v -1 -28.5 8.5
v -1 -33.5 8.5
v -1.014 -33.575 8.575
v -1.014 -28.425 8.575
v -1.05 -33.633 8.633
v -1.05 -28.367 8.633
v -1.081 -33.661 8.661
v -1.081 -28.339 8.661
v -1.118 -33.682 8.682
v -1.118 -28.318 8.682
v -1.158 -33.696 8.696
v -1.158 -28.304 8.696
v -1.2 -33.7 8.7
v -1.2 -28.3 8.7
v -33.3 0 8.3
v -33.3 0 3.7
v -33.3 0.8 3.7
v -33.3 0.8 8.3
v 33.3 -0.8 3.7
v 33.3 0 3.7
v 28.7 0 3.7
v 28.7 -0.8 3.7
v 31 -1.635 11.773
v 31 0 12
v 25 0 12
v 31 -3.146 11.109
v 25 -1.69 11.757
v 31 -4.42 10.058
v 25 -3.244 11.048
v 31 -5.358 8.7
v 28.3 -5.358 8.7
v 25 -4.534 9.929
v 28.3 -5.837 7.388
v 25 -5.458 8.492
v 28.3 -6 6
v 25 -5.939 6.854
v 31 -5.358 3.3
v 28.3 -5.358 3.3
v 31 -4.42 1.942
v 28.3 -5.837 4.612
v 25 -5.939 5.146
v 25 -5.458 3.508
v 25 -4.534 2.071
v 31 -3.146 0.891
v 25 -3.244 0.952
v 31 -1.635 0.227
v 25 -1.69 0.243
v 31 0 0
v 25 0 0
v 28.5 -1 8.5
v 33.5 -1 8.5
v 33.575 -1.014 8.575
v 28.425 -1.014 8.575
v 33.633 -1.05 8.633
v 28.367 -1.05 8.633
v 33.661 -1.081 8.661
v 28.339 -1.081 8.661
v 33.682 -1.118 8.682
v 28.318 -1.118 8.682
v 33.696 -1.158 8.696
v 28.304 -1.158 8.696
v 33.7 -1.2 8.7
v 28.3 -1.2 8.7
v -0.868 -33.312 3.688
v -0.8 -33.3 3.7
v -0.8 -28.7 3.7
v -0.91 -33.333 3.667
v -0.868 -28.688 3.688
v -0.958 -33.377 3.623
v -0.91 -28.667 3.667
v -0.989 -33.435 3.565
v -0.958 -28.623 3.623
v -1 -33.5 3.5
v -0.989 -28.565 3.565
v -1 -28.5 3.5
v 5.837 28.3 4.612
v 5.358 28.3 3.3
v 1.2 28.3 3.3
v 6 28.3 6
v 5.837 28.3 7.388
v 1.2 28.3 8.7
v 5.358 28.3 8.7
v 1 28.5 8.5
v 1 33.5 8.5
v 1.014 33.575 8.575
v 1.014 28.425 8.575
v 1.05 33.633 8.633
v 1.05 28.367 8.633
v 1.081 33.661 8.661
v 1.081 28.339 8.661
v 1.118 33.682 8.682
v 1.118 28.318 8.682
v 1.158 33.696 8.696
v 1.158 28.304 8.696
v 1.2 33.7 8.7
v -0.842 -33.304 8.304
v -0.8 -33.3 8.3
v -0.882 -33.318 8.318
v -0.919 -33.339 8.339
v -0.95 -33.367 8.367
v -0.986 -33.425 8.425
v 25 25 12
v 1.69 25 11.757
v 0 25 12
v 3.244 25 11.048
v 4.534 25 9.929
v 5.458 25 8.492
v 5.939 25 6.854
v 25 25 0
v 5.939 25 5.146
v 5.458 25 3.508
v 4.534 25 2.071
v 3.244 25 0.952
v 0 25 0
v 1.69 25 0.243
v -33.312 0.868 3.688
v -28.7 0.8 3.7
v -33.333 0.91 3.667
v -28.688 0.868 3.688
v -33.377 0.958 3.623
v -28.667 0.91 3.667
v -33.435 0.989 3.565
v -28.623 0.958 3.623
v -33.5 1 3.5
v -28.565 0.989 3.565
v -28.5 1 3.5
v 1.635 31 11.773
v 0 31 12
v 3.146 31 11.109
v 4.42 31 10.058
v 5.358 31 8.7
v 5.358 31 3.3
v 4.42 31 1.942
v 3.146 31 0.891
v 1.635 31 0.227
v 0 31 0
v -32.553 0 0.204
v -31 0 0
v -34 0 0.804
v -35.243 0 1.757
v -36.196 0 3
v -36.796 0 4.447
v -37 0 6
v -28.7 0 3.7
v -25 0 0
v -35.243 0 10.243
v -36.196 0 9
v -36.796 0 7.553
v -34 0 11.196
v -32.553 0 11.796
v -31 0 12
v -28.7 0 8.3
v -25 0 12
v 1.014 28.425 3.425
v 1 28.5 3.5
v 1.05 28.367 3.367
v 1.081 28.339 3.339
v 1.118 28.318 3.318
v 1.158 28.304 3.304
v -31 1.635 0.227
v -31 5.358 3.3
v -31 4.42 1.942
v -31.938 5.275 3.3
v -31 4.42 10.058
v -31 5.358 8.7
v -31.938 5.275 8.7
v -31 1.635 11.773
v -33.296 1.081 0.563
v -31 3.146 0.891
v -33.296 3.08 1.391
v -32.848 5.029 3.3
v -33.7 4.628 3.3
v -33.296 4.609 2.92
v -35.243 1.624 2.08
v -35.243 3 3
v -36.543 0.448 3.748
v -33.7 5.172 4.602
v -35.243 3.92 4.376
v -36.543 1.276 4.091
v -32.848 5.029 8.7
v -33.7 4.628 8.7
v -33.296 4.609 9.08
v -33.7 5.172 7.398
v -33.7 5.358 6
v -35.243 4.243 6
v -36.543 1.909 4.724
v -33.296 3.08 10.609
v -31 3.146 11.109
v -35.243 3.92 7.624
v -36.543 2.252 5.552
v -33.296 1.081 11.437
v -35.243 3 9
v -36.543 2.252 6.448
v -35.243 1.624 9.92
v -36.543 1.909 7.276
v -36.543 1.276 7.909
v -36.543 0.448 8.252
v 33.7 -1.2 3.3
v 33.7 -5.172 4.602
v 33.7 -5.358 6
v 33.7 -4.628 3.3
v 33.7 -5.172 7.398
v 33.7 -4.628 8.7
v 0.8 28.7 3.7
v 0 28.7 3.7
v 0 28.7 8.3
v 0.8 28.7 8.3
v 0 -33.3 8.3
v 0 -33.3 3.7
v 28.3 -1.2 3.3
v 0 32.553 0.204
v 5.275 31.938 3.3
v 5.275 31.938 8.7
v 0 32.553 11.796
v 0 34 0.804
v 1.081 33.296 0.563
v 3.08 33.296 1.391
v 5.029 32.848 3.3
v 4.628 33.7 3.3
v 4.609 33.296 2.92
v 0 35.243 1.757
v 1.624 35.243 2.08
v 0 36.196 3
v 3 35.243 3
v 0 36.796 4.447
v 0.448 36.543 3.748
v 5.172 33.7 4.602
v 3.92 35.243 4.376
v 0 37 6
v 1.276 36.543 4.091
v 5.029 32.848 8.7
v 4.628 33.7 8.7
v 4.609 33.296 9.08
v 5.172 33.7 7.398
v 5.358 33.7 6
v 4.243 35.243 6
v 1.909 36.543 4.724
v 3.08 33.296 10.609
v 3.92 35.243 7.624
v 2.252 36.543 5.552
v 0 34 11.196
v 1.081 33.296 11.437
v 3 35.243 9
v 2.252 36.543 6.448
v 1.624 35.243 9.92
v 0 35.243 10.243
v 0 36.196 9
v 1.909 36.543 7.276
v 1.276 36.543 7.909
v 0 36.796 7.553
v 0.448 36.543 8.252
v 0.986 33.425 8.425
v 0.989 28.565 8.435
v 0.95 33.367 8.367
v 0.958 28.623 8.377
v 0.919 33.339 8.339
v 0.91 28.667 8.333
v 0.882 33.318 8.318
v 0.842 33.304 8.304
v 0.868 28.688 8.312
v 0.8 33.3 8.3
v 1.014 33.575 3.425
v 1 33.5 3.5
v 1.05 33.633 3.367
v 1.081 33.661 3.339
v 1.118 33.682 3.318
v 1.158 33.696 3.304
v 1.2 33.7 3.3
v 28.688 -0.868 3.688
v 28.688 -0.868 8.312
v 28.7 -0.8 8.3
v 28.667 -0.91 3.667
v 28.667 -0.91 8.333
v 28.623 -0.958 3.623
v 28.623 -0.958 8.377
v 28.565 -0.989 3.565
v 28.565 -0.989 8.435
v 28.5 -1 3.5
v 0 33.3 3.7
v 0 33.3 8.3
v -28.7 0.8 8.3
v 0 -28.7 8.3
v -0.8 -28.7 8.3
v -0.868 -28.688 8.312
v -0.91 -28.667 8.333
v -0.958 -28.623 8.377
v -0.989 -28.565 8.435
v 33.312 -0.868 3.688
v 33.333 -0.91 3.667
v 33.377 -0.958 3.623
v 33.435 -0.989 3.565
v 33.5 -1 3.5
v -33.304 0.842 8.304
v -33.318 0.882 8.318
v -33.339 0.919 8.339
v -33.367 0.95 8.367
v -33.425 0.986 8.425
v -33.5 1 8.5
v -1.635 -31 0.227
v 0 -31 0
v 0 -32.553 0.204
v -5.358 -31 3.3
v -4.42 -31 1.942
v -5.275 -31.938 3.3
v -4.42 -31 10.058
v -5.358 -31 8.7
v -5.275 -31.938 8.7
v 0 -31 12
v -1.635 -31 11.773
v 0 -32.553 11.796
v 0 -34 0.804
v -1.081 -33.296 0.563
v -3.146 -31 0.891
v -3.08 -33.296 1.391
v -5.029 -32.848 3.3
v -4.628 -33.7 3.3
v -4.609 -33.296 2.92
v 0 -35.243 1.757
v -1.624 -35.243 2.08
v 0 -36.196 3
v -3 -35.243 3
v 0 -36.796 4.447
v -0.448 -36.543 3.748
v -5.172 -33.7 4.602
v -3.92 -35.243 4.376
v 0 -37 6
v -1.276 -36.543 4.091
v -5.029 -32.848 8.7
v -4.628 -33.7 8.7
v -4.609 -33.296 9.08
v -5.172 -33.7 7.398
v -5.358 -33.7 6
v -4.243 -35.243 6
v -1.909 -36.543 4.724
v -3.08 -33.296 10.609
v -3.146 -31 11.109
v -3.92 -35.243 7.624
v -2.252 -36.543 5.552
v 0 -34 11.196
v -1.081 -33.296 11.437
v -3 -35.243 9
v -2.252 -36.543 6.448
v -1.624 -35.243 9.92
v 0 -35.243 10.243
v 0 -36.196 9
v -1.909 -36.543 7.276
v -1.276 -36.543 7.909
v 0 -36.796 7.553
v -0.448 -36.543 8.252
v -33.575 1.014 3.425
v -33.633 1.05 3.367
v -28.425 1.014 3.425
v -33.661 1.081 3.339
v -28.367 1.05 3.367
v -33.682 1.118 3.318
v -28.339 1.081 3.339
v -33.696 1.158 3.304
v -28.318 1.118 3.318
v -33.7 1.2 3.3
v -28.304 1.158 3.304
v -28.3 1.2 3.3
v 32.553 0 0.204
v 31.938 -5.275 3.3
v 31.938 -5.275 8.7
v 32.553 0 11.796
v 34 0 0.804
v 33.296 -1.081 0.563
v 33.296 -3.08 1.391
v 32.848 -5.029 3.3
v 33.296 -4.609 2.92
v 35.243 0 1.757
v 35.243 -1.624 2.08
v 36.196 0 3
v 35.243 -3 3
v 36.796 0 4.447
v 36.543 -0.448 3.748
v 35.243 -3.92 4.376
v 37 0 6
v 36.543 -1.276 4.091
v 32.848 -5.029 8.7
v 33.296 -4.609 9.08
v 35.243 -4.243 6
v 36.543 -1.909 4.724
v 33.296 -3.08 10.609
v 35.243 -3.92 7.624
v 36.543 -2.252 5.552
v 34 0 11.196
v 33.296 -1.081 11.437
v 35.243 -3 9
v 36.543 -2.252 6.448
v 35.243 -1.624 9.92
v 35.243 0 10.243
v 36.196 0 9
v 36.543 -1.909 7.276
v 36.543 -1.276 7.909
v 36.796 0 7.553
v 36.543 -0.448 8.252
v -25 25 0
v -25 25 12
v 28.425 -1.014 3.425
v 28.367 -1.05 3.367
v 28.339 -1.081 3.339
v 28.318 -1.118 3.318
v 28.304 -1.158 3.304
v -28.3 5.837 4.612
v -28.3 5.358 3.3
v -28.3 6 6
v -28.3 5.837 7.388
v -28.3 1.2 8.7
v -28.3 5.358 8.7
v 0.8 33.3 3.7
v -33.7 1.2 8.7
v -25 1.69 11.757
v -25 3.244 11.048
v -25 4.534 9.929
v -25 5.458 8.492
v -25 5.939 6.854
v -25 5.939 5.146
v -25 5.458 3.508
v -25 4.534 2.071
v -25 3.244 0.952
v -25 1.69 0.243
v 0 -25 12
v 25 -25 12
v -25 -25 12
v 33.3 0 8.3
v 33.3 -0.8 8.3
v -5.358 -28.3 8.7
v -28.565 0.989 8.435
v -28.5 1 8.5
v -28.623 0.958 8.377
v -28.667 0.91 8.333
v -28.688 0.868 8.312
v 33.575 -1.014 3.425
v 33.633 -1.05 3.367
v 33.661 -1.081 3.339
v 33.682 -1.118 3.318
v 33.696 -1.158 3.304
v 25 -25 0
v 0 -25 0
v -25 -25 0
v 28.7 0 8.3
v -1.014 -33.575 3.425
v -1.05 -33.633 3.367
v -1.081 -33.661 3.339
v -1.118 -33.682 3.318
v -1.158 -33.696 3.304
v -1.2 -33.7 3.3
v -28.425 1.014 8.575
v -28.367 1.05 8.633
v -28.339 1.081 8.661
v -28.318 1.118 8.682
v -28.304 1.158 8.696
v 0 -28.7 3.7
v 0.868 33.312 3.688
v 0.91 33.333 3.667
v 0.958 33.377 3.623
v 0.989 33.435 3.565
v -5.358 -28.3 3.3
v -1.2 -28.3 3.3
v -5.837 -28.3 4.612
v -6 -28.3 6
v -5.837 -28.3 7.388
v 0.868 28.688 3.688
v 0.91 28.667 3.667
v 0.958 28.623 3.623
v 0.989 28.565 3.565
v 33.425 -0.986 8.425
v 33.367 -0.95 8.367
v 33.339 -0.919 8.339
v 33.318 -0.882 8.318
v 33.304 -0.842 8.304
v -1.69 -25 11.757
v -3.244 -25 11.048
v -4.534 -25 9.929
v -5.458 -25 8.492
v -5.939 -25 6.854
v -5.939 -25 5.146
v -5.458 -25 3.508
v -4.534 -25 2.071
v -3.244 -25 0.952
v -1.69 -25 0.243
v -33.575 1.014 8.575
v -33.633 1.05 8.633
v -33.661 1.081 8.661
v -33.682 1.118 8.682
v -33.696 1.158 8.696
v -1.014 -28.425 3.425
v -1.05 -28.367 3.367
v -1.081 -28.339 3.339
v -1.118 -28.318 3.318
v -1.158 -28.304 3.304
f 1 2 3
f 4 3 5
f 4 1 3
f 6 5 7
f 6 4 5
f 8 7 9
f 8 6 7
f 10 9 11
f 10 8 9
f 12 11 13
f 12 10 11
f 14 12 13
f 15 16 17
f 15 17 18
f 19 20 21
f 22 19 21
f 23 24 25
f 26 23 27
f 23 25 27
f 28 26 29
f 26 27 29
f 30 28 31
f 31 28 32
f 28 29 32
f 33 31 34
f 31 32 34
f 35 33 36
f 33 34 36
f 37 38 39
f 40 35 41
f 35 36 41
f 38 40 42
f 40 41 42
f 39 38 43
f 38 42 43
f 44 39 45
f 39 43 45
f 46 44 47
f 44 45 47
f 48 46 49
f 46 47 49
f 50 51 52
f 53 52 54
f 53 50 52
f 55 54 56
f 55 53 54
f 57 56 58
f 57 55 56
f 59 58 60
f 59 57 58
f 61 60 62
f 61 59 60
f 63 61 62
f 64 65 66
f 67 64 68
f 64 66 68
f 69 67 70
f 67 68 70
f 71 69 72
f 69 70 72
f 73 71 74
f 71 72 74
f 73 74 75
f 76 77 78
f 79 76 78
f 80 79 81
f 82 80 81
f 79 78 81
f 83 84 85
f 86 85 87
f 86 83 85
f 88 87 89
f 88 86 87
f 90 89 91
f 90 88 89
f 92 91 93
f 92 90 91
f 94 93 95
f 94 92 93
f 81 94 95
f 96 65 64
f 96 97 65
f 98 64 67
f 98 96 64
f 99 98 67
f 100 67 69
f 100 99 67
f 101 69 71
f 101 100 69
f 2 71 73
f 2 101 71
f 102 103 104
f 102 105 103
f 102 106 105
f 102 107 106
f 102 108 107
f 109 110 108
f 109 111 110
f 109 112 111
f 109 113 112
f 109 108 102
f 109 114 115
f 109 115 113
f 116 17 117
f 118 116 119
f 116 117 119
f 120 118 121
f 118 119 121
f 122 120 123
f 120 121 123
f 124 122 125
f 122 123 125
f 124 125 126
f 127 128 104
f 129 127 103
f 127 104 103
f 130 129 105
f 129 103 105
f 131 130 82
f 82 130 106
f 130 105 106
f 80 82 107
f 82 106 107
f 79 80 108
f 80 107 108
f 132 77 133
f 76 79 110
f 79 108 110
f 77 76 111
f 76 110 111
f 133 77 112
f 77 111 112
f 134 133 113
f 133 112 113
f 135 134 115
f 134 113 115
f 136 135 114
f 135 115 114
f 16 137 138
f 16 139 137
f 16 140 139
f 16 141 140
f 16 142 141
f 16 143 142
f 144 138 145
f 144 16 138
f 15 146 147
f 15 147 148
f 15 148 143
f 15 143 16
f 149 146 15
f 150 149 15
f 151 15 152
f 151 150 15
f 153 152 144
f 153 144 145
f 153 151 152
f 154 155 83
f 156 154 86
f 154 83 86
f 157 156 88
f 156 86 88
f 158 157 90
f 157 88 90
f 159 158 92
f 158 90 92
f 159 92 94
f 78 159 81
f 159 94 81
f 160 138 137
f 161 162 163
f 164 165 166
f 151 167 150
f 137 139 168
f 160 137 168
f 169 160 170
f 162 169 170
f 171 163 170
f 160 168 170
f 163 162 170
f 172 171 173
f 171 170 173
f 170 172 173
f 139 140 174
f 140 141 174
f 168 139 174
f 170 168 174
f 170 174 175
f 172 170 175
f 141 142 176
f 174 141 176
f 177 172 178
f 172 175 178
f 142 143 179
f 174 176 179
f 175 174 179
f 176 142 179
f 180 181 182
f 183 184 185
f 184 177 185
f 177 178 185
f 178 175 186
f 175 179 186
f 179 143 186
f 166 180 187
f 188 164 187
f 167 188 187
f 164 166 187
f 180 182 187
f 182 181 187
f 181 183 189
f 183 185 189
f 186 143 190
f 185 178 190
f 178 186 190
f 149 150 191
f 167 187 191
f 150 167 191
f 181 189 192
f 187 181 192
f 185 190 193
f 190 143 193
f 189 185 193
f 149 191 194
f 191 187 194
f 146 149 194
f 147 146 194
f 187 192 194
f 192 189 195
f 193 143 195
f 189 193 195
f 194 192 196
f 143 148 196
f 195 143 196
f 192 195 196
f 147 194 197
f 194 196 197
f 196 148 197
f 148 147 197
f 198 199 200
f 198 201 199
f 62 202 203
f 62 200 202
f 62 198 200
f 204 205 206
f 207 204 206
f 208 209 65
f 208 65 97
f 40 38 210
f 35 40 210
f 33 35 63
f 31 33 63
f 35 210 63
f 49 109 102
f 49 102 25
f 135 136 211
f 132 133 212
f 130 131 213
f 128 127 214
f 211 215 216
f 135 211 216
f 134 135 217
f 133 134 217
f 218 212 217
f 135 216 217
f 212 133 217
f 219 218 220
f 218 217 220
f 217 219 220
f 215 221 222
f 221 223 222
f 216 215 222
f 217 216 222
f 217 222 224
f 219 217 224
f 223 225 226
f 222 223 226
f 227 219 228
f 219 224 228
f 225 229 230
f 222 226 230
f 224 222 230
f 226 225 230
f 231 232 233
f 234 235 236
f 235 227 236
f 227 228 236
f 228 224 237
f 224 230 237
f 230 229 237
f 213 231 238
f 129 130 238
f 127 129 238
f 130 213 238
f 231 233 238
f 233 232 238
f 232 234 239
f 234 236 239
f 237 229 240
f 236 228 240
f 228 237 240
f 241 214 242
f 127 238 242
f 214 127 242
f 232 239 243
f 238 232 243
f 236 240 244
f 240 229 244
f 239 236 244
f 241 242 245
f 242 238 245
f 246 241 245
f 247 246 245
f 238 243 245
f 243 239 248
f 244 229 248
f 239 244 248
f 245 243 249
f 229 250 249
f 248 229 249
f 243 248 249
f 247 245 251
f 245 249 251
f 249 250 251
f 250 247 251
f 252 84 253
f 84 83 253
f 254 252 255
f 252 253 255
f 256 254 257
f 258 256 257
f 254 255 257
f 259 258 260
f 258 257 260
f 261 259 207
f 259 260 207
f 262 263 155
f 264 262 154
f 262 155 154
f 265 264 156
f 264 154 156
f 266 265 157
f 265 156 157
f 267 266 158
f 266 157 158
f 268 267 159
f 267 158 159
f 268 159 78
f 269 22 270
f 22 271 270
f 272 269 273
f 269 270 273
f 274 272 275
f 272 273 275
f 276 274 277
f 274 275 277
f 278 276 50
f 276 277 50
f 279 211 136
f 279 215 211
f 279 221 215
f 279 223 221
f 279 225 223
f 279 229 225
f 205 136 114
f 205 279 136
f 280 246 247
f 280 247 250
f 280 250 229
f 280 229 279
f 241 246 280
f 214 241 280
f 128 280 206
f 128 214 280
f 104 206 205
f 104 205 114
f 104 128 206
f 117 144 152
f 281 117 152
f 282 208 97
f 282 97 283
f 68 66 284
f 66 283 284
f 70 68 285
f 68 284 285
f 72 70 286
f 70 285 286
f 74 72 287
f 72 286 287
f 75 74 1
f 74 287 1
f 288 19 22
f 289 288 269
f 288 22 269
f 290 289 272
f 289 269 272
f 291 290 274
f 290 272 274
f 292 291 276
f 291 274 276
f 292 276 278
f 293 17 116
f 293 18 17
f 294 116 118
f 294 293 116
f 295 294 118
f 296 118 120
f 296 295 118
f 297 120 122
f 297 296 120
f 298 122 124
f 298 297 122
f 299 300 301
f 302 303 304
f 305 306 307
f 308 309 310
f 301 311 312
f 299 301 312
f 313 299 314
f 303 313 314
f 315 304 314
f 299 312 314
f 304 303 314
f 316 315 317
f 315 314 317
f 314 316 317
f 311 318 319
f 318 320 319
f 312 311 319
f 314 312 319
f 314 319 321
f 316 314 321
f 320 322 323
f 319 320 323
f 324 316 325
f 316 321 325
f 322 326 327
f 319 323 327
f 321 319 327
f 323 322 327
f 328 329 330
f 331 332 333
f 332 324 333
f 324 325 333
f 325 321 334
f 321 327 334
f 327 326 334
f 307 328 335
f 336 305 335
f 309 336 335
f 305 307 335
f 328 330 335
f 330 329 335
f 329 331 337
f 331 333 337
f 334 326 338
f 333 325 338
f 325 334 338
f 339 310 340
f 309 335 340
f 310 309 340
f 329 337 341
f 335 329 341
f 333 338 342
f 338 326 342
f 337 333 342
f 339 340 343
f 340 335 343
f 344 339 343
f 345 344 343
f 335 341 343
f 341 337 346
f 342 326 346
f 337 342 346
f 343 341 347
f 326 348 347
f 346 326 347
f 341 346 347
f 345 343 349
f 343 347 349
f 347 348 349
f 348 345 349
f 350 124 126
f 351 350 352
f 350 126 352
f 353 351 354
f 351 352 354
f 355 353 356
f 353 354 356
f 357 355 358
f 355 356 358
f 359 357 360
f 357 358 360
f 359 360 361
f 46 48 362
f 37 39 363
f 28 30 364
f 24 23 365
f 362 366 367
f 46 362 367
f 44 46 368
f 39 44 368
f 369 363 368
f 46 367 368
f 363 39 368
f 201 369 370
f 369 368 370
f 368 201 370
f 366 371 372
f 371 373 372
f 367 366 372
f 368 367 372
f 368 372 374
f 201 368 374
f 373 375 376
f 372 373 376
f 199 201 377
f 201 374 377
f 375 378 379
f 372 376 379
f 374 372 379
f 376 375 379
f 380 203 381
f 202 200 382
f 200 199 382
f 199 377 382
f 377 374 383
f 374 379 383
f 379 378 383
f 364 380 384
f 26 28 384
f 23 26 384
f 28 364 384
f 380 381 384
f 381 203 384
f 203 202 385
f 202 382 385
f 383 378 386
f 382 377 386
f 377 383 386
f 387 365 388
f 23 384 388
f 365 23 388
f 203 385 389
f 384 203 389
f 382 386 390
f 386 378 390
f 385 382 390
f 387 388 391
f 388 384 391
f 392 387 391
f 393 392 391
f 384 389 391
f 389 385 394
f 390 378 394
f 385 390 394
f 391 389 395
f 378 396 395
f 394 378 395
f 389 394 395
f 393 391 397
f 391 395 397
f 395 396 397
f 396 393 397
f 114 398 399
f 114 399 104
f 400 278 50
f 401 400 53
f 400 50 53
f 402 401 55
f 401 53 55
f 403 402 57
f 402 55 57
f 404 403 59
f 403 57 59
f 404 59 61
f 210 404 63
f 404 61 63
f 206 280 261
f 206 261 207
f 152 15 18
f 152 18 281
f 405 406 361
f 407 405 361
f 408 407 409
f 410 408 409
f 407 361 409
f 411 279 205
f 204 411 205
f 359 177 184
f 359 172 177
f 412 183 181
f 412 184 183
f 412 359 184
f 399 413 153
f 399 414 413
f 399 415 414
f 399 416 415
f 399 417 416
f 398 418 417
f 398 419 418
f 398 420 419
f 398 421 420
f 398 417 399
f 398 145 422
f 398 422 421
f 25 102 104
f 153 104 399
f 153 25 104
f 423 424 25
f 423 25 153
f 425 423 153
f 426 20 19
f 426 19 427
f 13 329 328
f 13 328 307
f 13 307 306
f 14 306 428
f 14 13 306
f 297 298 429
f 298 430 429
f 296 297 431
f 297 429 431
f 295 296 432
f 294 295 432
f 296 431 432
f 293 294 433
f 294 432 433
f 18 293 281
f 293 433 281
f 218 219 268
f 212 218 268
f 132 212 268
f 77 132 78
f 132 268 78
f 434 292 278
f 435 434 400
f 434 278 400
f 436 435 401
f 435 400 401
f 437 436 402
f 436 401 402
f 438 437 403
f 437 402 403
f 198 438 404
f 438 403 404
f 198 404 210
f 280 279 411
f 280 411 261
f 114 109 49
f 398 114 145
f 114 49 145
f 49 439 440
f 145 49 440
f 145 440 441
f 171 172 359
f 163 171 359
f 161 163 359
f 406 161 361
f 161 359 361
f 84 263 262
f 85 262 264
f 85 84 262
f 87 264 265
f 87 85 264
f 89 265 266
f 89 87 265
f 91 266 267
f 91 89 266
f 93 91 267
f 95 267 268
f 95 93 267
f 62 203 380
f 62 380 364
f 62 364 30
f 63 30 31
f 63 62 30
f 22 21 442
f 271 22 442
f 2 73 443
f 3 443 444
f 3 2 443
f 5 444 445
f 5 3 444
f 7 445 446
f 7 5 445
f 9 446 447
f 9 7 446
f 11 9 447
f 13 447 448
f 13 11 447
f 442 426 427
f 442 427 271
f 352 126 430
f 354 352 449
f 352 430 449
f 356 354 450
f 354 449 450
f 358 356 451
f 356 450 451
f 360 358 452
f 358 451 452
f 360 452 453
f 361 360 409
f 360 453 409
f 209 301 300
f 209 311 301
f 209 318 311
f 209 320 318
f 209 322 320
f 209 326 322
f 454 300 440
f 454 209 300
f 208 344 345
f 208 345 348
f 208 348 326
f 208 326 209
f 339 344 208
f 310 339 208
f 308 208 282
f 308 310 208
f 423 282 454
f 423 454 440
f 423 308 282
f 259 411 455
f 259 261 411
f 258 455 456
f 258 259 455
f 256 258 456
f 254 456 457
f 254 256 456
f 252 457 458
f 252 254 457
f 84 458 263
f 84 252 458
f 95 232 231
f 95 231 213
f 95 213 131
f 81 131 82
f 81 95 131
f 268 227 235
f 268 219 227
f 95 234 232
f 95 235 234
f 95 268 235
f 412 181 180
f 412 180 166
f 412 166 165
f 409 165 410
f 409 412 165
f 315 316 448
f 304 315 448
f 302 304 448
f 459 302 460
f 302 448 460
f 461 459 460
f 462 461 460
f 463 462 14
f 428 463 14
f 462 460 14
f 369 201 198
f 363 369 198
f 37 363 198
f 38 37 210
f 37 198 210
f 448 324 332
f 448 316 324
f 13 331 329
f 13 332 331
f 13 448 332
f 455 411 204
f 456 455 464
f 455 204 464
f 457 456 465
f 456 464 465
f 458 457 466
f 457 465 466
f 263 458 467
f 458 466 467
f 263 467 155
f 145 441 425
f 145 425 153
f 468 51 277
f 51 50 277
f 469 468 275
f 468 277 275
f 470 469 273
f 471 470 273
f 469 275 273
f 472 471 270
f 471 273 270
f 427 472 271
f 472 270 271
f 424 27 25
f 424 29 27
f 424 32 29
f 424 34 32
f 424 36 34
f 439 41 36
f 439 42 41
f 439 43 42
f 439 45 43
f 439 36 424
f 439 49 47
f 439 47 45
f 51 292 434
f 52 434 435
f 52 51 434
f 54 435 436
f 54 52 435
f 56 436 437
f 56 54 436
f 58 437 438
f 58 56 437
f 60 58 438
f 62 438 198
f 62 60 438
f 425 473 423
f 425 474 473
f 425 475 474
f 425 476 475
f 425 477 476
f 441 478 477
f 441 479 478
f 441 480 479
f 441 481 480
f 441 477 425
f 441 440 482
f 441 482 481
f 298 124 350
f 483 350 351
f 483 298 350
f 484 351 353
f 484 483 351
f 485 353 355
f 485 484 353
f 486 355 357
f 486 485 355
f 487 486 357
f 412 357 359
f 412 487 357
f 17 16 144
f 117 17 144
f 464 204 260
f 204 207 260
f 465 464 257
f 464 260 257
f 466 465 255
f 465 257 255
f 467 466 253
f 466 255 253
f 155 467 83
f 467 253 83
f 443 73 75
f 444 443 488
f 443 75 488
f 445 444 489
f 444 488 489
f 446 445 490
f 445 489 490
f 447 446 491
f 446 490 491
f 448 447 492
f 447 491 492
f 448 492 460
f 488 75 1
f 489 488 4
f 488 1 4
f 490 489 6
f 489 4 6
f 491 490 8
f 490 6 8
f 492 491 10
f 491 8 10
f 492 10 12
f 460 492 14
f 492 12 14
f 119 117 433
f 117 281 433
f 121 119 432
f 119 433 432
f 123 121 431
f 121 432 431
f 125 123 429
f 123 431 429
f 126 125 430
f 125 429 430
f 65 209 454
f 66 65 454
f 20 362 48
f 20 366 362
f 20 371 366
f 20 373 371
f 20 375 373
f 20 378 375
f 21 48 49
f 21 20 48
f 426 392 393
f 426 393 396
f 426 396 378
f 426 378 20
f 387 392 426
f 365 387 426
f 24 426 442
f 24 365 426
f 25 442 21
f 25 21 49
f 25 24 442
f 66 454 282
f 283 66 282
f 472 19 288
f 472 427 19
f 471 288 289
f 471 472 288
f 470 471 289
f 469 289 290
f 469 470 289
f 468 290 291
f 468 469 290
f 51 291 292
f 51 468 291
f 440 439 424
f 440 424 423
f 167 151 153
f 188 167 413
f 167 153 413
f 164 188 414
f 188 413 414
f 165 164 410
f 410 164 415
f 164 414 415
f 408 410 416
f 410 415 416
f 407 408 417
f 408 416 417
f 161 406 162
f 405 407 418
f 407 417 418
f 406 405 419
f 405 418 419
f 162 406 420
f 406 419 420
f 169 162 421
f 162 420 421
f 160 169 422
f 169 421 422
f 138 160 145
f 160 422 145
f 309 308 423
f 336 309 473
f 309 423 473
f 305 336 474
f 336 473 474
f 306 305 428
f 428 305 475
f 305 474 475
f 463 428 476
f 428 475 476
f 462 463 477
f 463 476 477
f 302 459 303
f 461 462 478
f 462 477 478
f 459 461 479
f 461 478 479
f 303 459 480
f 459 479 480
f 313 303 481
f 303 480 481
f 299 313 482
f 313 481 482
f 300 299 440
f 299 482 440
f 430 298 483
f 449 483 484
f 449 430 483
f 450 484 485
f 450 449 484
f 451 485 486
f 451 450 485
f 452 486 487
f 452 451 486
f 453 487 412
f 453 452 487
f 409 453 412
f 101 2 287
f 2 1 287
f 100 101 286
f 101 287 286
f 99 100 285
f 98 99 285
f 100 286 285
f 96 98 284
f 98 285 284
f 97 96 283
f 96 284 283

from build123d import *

# Parameters (mm, degrees)
F0_W      = 50
F0_H      = 50
F1_DEPTH  = 12
F3_DEPTH  = 12
F5_W      = 7.196964696
F5_H      = 12
F6_DEPTH  = 25
F7_W      = 5.4
F7_H      = 5.4
F8_DEPTH  = 25
F9_W      = 5.4
F9_H      = 5.4
F9_W_2    = 4.6
F9_H_2    = 4.6
F10_DEPTH = 1
F11_R     = 0.19999
F13_W     = 25
F13_H     = 12
F14_DEPTH = 50
F15_W     = 25
F15_H     = 12
F16_DEPTH = 25
F17_COUNT = 4


# Not quite as in the source:
# - a fillet or chamfer that OpenCascade refuses, or shapes differently, is made with other operations: its cross-section is extruded or revolved along the edge and cut away or added
# - a fillet or chamfer is up to 0.001 mm smaller than in the source, because OpenCascade refuses the exact size


with BuildPart() as f1:
    # F0 (on Top) → F1 (new body)
    with BuildSketch(Plane.XY):
        Rectangle(F0_W, F0_H)
    extrude(amount=F1_DEPTH)

    # F2 (on face) → F3 (join)
    with BuildSketch(Plane(origin=(-25, 0, 0), x_dir=(0, -1, 0), z_dir=(-1, 0, 0))):
        with BuildLine():
            ThreePointArc((0, 0), (4.2426406871, 1.7573593129), (6, 6))
            ThreePointArc((6, 6), (4.2426406871, 10.2426406871), (0, 12))
            ThreePointArc((0, 12), (-6, 6), (0, 0))
        make_face()
    extrude(amount=F3_DEPTH)

    # F4: fillet of radius 6 on 1 edges, made by hand

    # F4_s1 → F4_t2 (revolve, cut)
    with BuildSketch(Plane.XZ):
        with BuildLine():
            ThreePointArc((-31, 12), (-35.2426406871, 10.2426406871), (-37, 6))
            Line((-37, 6), (-37.12, 6))
            Line((-37.12, 6), (-37.12, 12.12))
            Line((-37.12, 12.12), (-31, 12.12))
            Line((-31, 12.12), (-31, 12))
        make_face()
    revolve(axis=Axis((-37, 0, 6), (1, 0, 0)), mode=Mode.SUBTRACT)

    # F5 (on face) → F6 (cut)
    with BuildSketch(Plane(origin=(-25, 0, 0), x_dir=(0, -1, 0), z_dir=(-1, 0, 0))):
        with Locations((3.598482348, 6)):
            Rectangle(F5_W, F5_H)
    extrude(amount=F6_DEPTH, mode=Mode.SUBTRACT)

    # F7 (on face) → F8 (cut)
    with BuildSketch(Plane.XZ):
        with Locations((-31, 6)):
            Rectangle(F7_W, F7_H)
    extrude(amount=-F8_DEPTH, mode=Mode.SUBTRACT)

    # F9 (on face) → F10 (join)
    with BuildSketch(Plane.XZ):
        with Locations((-31, 6)):
            Rectangle(F9_W, F9_H)
        with Locations((-31, 6)):
            Rectangle(F9_W_2, F9_H_2, mode=Mode.SUBTRACT)
    extrude(amount=-F10_DEPTH)

    # F11 (radius 0.2 in the source; OpenCascade refuses exactly that, so slightly less here)
    f11_edges = [f1.edges().sort_by_distance(p)[0] for p in [
        (-28.7, 1, 6),
        (-28.3, 1, 6),
        (-31, 1, 8.7),
        (-31, 1, 8.3),
        (-33.7, 1, 6),
        (-33.3, 1, 6),
        (-31, 1, 3.3),
        (-31, 1, 3.7),
    ]]
    fillet(f11_edges, radius=F11_R)

    # F13 (on face) → F14 (cut)
    with BuildSketch(Plane(origin=(-25, 0, 0), x_dir=(0, -1, 0), z_dir=(-1, 0, 0))):
        with Locations((12.5, 6)):
            Rectangle(F13_W, F13_H)
    extrude(amount=-F14_DEPTH, mode=Mode.SUBTRACT)

    # F15 (on face) → F16 (cut)
    with BuildSketch(Plane(origin=(0, 25, 0), x_dir=(-1, 0, 0), z_dir=(0, 1, 0))):
        with Locations((-12.5, 6)):
            Rectangle(F15_W, F15_H)
    extrude(amount=-F16_DEPTH, mode=Mode.SUBTRACT)

    # F17: F1 ×4 about axis
    f17_axis = Axis((0, 0, 13.6458836496), (0, 0, 1))


with BuildPart() as f1_1:
    add(f1.part)
    for i in range(1, F17_COUNT):
        add(f1.part.rotate(f17_axis, i * 360 / F17_COUNT))


solid = f1_1.part
